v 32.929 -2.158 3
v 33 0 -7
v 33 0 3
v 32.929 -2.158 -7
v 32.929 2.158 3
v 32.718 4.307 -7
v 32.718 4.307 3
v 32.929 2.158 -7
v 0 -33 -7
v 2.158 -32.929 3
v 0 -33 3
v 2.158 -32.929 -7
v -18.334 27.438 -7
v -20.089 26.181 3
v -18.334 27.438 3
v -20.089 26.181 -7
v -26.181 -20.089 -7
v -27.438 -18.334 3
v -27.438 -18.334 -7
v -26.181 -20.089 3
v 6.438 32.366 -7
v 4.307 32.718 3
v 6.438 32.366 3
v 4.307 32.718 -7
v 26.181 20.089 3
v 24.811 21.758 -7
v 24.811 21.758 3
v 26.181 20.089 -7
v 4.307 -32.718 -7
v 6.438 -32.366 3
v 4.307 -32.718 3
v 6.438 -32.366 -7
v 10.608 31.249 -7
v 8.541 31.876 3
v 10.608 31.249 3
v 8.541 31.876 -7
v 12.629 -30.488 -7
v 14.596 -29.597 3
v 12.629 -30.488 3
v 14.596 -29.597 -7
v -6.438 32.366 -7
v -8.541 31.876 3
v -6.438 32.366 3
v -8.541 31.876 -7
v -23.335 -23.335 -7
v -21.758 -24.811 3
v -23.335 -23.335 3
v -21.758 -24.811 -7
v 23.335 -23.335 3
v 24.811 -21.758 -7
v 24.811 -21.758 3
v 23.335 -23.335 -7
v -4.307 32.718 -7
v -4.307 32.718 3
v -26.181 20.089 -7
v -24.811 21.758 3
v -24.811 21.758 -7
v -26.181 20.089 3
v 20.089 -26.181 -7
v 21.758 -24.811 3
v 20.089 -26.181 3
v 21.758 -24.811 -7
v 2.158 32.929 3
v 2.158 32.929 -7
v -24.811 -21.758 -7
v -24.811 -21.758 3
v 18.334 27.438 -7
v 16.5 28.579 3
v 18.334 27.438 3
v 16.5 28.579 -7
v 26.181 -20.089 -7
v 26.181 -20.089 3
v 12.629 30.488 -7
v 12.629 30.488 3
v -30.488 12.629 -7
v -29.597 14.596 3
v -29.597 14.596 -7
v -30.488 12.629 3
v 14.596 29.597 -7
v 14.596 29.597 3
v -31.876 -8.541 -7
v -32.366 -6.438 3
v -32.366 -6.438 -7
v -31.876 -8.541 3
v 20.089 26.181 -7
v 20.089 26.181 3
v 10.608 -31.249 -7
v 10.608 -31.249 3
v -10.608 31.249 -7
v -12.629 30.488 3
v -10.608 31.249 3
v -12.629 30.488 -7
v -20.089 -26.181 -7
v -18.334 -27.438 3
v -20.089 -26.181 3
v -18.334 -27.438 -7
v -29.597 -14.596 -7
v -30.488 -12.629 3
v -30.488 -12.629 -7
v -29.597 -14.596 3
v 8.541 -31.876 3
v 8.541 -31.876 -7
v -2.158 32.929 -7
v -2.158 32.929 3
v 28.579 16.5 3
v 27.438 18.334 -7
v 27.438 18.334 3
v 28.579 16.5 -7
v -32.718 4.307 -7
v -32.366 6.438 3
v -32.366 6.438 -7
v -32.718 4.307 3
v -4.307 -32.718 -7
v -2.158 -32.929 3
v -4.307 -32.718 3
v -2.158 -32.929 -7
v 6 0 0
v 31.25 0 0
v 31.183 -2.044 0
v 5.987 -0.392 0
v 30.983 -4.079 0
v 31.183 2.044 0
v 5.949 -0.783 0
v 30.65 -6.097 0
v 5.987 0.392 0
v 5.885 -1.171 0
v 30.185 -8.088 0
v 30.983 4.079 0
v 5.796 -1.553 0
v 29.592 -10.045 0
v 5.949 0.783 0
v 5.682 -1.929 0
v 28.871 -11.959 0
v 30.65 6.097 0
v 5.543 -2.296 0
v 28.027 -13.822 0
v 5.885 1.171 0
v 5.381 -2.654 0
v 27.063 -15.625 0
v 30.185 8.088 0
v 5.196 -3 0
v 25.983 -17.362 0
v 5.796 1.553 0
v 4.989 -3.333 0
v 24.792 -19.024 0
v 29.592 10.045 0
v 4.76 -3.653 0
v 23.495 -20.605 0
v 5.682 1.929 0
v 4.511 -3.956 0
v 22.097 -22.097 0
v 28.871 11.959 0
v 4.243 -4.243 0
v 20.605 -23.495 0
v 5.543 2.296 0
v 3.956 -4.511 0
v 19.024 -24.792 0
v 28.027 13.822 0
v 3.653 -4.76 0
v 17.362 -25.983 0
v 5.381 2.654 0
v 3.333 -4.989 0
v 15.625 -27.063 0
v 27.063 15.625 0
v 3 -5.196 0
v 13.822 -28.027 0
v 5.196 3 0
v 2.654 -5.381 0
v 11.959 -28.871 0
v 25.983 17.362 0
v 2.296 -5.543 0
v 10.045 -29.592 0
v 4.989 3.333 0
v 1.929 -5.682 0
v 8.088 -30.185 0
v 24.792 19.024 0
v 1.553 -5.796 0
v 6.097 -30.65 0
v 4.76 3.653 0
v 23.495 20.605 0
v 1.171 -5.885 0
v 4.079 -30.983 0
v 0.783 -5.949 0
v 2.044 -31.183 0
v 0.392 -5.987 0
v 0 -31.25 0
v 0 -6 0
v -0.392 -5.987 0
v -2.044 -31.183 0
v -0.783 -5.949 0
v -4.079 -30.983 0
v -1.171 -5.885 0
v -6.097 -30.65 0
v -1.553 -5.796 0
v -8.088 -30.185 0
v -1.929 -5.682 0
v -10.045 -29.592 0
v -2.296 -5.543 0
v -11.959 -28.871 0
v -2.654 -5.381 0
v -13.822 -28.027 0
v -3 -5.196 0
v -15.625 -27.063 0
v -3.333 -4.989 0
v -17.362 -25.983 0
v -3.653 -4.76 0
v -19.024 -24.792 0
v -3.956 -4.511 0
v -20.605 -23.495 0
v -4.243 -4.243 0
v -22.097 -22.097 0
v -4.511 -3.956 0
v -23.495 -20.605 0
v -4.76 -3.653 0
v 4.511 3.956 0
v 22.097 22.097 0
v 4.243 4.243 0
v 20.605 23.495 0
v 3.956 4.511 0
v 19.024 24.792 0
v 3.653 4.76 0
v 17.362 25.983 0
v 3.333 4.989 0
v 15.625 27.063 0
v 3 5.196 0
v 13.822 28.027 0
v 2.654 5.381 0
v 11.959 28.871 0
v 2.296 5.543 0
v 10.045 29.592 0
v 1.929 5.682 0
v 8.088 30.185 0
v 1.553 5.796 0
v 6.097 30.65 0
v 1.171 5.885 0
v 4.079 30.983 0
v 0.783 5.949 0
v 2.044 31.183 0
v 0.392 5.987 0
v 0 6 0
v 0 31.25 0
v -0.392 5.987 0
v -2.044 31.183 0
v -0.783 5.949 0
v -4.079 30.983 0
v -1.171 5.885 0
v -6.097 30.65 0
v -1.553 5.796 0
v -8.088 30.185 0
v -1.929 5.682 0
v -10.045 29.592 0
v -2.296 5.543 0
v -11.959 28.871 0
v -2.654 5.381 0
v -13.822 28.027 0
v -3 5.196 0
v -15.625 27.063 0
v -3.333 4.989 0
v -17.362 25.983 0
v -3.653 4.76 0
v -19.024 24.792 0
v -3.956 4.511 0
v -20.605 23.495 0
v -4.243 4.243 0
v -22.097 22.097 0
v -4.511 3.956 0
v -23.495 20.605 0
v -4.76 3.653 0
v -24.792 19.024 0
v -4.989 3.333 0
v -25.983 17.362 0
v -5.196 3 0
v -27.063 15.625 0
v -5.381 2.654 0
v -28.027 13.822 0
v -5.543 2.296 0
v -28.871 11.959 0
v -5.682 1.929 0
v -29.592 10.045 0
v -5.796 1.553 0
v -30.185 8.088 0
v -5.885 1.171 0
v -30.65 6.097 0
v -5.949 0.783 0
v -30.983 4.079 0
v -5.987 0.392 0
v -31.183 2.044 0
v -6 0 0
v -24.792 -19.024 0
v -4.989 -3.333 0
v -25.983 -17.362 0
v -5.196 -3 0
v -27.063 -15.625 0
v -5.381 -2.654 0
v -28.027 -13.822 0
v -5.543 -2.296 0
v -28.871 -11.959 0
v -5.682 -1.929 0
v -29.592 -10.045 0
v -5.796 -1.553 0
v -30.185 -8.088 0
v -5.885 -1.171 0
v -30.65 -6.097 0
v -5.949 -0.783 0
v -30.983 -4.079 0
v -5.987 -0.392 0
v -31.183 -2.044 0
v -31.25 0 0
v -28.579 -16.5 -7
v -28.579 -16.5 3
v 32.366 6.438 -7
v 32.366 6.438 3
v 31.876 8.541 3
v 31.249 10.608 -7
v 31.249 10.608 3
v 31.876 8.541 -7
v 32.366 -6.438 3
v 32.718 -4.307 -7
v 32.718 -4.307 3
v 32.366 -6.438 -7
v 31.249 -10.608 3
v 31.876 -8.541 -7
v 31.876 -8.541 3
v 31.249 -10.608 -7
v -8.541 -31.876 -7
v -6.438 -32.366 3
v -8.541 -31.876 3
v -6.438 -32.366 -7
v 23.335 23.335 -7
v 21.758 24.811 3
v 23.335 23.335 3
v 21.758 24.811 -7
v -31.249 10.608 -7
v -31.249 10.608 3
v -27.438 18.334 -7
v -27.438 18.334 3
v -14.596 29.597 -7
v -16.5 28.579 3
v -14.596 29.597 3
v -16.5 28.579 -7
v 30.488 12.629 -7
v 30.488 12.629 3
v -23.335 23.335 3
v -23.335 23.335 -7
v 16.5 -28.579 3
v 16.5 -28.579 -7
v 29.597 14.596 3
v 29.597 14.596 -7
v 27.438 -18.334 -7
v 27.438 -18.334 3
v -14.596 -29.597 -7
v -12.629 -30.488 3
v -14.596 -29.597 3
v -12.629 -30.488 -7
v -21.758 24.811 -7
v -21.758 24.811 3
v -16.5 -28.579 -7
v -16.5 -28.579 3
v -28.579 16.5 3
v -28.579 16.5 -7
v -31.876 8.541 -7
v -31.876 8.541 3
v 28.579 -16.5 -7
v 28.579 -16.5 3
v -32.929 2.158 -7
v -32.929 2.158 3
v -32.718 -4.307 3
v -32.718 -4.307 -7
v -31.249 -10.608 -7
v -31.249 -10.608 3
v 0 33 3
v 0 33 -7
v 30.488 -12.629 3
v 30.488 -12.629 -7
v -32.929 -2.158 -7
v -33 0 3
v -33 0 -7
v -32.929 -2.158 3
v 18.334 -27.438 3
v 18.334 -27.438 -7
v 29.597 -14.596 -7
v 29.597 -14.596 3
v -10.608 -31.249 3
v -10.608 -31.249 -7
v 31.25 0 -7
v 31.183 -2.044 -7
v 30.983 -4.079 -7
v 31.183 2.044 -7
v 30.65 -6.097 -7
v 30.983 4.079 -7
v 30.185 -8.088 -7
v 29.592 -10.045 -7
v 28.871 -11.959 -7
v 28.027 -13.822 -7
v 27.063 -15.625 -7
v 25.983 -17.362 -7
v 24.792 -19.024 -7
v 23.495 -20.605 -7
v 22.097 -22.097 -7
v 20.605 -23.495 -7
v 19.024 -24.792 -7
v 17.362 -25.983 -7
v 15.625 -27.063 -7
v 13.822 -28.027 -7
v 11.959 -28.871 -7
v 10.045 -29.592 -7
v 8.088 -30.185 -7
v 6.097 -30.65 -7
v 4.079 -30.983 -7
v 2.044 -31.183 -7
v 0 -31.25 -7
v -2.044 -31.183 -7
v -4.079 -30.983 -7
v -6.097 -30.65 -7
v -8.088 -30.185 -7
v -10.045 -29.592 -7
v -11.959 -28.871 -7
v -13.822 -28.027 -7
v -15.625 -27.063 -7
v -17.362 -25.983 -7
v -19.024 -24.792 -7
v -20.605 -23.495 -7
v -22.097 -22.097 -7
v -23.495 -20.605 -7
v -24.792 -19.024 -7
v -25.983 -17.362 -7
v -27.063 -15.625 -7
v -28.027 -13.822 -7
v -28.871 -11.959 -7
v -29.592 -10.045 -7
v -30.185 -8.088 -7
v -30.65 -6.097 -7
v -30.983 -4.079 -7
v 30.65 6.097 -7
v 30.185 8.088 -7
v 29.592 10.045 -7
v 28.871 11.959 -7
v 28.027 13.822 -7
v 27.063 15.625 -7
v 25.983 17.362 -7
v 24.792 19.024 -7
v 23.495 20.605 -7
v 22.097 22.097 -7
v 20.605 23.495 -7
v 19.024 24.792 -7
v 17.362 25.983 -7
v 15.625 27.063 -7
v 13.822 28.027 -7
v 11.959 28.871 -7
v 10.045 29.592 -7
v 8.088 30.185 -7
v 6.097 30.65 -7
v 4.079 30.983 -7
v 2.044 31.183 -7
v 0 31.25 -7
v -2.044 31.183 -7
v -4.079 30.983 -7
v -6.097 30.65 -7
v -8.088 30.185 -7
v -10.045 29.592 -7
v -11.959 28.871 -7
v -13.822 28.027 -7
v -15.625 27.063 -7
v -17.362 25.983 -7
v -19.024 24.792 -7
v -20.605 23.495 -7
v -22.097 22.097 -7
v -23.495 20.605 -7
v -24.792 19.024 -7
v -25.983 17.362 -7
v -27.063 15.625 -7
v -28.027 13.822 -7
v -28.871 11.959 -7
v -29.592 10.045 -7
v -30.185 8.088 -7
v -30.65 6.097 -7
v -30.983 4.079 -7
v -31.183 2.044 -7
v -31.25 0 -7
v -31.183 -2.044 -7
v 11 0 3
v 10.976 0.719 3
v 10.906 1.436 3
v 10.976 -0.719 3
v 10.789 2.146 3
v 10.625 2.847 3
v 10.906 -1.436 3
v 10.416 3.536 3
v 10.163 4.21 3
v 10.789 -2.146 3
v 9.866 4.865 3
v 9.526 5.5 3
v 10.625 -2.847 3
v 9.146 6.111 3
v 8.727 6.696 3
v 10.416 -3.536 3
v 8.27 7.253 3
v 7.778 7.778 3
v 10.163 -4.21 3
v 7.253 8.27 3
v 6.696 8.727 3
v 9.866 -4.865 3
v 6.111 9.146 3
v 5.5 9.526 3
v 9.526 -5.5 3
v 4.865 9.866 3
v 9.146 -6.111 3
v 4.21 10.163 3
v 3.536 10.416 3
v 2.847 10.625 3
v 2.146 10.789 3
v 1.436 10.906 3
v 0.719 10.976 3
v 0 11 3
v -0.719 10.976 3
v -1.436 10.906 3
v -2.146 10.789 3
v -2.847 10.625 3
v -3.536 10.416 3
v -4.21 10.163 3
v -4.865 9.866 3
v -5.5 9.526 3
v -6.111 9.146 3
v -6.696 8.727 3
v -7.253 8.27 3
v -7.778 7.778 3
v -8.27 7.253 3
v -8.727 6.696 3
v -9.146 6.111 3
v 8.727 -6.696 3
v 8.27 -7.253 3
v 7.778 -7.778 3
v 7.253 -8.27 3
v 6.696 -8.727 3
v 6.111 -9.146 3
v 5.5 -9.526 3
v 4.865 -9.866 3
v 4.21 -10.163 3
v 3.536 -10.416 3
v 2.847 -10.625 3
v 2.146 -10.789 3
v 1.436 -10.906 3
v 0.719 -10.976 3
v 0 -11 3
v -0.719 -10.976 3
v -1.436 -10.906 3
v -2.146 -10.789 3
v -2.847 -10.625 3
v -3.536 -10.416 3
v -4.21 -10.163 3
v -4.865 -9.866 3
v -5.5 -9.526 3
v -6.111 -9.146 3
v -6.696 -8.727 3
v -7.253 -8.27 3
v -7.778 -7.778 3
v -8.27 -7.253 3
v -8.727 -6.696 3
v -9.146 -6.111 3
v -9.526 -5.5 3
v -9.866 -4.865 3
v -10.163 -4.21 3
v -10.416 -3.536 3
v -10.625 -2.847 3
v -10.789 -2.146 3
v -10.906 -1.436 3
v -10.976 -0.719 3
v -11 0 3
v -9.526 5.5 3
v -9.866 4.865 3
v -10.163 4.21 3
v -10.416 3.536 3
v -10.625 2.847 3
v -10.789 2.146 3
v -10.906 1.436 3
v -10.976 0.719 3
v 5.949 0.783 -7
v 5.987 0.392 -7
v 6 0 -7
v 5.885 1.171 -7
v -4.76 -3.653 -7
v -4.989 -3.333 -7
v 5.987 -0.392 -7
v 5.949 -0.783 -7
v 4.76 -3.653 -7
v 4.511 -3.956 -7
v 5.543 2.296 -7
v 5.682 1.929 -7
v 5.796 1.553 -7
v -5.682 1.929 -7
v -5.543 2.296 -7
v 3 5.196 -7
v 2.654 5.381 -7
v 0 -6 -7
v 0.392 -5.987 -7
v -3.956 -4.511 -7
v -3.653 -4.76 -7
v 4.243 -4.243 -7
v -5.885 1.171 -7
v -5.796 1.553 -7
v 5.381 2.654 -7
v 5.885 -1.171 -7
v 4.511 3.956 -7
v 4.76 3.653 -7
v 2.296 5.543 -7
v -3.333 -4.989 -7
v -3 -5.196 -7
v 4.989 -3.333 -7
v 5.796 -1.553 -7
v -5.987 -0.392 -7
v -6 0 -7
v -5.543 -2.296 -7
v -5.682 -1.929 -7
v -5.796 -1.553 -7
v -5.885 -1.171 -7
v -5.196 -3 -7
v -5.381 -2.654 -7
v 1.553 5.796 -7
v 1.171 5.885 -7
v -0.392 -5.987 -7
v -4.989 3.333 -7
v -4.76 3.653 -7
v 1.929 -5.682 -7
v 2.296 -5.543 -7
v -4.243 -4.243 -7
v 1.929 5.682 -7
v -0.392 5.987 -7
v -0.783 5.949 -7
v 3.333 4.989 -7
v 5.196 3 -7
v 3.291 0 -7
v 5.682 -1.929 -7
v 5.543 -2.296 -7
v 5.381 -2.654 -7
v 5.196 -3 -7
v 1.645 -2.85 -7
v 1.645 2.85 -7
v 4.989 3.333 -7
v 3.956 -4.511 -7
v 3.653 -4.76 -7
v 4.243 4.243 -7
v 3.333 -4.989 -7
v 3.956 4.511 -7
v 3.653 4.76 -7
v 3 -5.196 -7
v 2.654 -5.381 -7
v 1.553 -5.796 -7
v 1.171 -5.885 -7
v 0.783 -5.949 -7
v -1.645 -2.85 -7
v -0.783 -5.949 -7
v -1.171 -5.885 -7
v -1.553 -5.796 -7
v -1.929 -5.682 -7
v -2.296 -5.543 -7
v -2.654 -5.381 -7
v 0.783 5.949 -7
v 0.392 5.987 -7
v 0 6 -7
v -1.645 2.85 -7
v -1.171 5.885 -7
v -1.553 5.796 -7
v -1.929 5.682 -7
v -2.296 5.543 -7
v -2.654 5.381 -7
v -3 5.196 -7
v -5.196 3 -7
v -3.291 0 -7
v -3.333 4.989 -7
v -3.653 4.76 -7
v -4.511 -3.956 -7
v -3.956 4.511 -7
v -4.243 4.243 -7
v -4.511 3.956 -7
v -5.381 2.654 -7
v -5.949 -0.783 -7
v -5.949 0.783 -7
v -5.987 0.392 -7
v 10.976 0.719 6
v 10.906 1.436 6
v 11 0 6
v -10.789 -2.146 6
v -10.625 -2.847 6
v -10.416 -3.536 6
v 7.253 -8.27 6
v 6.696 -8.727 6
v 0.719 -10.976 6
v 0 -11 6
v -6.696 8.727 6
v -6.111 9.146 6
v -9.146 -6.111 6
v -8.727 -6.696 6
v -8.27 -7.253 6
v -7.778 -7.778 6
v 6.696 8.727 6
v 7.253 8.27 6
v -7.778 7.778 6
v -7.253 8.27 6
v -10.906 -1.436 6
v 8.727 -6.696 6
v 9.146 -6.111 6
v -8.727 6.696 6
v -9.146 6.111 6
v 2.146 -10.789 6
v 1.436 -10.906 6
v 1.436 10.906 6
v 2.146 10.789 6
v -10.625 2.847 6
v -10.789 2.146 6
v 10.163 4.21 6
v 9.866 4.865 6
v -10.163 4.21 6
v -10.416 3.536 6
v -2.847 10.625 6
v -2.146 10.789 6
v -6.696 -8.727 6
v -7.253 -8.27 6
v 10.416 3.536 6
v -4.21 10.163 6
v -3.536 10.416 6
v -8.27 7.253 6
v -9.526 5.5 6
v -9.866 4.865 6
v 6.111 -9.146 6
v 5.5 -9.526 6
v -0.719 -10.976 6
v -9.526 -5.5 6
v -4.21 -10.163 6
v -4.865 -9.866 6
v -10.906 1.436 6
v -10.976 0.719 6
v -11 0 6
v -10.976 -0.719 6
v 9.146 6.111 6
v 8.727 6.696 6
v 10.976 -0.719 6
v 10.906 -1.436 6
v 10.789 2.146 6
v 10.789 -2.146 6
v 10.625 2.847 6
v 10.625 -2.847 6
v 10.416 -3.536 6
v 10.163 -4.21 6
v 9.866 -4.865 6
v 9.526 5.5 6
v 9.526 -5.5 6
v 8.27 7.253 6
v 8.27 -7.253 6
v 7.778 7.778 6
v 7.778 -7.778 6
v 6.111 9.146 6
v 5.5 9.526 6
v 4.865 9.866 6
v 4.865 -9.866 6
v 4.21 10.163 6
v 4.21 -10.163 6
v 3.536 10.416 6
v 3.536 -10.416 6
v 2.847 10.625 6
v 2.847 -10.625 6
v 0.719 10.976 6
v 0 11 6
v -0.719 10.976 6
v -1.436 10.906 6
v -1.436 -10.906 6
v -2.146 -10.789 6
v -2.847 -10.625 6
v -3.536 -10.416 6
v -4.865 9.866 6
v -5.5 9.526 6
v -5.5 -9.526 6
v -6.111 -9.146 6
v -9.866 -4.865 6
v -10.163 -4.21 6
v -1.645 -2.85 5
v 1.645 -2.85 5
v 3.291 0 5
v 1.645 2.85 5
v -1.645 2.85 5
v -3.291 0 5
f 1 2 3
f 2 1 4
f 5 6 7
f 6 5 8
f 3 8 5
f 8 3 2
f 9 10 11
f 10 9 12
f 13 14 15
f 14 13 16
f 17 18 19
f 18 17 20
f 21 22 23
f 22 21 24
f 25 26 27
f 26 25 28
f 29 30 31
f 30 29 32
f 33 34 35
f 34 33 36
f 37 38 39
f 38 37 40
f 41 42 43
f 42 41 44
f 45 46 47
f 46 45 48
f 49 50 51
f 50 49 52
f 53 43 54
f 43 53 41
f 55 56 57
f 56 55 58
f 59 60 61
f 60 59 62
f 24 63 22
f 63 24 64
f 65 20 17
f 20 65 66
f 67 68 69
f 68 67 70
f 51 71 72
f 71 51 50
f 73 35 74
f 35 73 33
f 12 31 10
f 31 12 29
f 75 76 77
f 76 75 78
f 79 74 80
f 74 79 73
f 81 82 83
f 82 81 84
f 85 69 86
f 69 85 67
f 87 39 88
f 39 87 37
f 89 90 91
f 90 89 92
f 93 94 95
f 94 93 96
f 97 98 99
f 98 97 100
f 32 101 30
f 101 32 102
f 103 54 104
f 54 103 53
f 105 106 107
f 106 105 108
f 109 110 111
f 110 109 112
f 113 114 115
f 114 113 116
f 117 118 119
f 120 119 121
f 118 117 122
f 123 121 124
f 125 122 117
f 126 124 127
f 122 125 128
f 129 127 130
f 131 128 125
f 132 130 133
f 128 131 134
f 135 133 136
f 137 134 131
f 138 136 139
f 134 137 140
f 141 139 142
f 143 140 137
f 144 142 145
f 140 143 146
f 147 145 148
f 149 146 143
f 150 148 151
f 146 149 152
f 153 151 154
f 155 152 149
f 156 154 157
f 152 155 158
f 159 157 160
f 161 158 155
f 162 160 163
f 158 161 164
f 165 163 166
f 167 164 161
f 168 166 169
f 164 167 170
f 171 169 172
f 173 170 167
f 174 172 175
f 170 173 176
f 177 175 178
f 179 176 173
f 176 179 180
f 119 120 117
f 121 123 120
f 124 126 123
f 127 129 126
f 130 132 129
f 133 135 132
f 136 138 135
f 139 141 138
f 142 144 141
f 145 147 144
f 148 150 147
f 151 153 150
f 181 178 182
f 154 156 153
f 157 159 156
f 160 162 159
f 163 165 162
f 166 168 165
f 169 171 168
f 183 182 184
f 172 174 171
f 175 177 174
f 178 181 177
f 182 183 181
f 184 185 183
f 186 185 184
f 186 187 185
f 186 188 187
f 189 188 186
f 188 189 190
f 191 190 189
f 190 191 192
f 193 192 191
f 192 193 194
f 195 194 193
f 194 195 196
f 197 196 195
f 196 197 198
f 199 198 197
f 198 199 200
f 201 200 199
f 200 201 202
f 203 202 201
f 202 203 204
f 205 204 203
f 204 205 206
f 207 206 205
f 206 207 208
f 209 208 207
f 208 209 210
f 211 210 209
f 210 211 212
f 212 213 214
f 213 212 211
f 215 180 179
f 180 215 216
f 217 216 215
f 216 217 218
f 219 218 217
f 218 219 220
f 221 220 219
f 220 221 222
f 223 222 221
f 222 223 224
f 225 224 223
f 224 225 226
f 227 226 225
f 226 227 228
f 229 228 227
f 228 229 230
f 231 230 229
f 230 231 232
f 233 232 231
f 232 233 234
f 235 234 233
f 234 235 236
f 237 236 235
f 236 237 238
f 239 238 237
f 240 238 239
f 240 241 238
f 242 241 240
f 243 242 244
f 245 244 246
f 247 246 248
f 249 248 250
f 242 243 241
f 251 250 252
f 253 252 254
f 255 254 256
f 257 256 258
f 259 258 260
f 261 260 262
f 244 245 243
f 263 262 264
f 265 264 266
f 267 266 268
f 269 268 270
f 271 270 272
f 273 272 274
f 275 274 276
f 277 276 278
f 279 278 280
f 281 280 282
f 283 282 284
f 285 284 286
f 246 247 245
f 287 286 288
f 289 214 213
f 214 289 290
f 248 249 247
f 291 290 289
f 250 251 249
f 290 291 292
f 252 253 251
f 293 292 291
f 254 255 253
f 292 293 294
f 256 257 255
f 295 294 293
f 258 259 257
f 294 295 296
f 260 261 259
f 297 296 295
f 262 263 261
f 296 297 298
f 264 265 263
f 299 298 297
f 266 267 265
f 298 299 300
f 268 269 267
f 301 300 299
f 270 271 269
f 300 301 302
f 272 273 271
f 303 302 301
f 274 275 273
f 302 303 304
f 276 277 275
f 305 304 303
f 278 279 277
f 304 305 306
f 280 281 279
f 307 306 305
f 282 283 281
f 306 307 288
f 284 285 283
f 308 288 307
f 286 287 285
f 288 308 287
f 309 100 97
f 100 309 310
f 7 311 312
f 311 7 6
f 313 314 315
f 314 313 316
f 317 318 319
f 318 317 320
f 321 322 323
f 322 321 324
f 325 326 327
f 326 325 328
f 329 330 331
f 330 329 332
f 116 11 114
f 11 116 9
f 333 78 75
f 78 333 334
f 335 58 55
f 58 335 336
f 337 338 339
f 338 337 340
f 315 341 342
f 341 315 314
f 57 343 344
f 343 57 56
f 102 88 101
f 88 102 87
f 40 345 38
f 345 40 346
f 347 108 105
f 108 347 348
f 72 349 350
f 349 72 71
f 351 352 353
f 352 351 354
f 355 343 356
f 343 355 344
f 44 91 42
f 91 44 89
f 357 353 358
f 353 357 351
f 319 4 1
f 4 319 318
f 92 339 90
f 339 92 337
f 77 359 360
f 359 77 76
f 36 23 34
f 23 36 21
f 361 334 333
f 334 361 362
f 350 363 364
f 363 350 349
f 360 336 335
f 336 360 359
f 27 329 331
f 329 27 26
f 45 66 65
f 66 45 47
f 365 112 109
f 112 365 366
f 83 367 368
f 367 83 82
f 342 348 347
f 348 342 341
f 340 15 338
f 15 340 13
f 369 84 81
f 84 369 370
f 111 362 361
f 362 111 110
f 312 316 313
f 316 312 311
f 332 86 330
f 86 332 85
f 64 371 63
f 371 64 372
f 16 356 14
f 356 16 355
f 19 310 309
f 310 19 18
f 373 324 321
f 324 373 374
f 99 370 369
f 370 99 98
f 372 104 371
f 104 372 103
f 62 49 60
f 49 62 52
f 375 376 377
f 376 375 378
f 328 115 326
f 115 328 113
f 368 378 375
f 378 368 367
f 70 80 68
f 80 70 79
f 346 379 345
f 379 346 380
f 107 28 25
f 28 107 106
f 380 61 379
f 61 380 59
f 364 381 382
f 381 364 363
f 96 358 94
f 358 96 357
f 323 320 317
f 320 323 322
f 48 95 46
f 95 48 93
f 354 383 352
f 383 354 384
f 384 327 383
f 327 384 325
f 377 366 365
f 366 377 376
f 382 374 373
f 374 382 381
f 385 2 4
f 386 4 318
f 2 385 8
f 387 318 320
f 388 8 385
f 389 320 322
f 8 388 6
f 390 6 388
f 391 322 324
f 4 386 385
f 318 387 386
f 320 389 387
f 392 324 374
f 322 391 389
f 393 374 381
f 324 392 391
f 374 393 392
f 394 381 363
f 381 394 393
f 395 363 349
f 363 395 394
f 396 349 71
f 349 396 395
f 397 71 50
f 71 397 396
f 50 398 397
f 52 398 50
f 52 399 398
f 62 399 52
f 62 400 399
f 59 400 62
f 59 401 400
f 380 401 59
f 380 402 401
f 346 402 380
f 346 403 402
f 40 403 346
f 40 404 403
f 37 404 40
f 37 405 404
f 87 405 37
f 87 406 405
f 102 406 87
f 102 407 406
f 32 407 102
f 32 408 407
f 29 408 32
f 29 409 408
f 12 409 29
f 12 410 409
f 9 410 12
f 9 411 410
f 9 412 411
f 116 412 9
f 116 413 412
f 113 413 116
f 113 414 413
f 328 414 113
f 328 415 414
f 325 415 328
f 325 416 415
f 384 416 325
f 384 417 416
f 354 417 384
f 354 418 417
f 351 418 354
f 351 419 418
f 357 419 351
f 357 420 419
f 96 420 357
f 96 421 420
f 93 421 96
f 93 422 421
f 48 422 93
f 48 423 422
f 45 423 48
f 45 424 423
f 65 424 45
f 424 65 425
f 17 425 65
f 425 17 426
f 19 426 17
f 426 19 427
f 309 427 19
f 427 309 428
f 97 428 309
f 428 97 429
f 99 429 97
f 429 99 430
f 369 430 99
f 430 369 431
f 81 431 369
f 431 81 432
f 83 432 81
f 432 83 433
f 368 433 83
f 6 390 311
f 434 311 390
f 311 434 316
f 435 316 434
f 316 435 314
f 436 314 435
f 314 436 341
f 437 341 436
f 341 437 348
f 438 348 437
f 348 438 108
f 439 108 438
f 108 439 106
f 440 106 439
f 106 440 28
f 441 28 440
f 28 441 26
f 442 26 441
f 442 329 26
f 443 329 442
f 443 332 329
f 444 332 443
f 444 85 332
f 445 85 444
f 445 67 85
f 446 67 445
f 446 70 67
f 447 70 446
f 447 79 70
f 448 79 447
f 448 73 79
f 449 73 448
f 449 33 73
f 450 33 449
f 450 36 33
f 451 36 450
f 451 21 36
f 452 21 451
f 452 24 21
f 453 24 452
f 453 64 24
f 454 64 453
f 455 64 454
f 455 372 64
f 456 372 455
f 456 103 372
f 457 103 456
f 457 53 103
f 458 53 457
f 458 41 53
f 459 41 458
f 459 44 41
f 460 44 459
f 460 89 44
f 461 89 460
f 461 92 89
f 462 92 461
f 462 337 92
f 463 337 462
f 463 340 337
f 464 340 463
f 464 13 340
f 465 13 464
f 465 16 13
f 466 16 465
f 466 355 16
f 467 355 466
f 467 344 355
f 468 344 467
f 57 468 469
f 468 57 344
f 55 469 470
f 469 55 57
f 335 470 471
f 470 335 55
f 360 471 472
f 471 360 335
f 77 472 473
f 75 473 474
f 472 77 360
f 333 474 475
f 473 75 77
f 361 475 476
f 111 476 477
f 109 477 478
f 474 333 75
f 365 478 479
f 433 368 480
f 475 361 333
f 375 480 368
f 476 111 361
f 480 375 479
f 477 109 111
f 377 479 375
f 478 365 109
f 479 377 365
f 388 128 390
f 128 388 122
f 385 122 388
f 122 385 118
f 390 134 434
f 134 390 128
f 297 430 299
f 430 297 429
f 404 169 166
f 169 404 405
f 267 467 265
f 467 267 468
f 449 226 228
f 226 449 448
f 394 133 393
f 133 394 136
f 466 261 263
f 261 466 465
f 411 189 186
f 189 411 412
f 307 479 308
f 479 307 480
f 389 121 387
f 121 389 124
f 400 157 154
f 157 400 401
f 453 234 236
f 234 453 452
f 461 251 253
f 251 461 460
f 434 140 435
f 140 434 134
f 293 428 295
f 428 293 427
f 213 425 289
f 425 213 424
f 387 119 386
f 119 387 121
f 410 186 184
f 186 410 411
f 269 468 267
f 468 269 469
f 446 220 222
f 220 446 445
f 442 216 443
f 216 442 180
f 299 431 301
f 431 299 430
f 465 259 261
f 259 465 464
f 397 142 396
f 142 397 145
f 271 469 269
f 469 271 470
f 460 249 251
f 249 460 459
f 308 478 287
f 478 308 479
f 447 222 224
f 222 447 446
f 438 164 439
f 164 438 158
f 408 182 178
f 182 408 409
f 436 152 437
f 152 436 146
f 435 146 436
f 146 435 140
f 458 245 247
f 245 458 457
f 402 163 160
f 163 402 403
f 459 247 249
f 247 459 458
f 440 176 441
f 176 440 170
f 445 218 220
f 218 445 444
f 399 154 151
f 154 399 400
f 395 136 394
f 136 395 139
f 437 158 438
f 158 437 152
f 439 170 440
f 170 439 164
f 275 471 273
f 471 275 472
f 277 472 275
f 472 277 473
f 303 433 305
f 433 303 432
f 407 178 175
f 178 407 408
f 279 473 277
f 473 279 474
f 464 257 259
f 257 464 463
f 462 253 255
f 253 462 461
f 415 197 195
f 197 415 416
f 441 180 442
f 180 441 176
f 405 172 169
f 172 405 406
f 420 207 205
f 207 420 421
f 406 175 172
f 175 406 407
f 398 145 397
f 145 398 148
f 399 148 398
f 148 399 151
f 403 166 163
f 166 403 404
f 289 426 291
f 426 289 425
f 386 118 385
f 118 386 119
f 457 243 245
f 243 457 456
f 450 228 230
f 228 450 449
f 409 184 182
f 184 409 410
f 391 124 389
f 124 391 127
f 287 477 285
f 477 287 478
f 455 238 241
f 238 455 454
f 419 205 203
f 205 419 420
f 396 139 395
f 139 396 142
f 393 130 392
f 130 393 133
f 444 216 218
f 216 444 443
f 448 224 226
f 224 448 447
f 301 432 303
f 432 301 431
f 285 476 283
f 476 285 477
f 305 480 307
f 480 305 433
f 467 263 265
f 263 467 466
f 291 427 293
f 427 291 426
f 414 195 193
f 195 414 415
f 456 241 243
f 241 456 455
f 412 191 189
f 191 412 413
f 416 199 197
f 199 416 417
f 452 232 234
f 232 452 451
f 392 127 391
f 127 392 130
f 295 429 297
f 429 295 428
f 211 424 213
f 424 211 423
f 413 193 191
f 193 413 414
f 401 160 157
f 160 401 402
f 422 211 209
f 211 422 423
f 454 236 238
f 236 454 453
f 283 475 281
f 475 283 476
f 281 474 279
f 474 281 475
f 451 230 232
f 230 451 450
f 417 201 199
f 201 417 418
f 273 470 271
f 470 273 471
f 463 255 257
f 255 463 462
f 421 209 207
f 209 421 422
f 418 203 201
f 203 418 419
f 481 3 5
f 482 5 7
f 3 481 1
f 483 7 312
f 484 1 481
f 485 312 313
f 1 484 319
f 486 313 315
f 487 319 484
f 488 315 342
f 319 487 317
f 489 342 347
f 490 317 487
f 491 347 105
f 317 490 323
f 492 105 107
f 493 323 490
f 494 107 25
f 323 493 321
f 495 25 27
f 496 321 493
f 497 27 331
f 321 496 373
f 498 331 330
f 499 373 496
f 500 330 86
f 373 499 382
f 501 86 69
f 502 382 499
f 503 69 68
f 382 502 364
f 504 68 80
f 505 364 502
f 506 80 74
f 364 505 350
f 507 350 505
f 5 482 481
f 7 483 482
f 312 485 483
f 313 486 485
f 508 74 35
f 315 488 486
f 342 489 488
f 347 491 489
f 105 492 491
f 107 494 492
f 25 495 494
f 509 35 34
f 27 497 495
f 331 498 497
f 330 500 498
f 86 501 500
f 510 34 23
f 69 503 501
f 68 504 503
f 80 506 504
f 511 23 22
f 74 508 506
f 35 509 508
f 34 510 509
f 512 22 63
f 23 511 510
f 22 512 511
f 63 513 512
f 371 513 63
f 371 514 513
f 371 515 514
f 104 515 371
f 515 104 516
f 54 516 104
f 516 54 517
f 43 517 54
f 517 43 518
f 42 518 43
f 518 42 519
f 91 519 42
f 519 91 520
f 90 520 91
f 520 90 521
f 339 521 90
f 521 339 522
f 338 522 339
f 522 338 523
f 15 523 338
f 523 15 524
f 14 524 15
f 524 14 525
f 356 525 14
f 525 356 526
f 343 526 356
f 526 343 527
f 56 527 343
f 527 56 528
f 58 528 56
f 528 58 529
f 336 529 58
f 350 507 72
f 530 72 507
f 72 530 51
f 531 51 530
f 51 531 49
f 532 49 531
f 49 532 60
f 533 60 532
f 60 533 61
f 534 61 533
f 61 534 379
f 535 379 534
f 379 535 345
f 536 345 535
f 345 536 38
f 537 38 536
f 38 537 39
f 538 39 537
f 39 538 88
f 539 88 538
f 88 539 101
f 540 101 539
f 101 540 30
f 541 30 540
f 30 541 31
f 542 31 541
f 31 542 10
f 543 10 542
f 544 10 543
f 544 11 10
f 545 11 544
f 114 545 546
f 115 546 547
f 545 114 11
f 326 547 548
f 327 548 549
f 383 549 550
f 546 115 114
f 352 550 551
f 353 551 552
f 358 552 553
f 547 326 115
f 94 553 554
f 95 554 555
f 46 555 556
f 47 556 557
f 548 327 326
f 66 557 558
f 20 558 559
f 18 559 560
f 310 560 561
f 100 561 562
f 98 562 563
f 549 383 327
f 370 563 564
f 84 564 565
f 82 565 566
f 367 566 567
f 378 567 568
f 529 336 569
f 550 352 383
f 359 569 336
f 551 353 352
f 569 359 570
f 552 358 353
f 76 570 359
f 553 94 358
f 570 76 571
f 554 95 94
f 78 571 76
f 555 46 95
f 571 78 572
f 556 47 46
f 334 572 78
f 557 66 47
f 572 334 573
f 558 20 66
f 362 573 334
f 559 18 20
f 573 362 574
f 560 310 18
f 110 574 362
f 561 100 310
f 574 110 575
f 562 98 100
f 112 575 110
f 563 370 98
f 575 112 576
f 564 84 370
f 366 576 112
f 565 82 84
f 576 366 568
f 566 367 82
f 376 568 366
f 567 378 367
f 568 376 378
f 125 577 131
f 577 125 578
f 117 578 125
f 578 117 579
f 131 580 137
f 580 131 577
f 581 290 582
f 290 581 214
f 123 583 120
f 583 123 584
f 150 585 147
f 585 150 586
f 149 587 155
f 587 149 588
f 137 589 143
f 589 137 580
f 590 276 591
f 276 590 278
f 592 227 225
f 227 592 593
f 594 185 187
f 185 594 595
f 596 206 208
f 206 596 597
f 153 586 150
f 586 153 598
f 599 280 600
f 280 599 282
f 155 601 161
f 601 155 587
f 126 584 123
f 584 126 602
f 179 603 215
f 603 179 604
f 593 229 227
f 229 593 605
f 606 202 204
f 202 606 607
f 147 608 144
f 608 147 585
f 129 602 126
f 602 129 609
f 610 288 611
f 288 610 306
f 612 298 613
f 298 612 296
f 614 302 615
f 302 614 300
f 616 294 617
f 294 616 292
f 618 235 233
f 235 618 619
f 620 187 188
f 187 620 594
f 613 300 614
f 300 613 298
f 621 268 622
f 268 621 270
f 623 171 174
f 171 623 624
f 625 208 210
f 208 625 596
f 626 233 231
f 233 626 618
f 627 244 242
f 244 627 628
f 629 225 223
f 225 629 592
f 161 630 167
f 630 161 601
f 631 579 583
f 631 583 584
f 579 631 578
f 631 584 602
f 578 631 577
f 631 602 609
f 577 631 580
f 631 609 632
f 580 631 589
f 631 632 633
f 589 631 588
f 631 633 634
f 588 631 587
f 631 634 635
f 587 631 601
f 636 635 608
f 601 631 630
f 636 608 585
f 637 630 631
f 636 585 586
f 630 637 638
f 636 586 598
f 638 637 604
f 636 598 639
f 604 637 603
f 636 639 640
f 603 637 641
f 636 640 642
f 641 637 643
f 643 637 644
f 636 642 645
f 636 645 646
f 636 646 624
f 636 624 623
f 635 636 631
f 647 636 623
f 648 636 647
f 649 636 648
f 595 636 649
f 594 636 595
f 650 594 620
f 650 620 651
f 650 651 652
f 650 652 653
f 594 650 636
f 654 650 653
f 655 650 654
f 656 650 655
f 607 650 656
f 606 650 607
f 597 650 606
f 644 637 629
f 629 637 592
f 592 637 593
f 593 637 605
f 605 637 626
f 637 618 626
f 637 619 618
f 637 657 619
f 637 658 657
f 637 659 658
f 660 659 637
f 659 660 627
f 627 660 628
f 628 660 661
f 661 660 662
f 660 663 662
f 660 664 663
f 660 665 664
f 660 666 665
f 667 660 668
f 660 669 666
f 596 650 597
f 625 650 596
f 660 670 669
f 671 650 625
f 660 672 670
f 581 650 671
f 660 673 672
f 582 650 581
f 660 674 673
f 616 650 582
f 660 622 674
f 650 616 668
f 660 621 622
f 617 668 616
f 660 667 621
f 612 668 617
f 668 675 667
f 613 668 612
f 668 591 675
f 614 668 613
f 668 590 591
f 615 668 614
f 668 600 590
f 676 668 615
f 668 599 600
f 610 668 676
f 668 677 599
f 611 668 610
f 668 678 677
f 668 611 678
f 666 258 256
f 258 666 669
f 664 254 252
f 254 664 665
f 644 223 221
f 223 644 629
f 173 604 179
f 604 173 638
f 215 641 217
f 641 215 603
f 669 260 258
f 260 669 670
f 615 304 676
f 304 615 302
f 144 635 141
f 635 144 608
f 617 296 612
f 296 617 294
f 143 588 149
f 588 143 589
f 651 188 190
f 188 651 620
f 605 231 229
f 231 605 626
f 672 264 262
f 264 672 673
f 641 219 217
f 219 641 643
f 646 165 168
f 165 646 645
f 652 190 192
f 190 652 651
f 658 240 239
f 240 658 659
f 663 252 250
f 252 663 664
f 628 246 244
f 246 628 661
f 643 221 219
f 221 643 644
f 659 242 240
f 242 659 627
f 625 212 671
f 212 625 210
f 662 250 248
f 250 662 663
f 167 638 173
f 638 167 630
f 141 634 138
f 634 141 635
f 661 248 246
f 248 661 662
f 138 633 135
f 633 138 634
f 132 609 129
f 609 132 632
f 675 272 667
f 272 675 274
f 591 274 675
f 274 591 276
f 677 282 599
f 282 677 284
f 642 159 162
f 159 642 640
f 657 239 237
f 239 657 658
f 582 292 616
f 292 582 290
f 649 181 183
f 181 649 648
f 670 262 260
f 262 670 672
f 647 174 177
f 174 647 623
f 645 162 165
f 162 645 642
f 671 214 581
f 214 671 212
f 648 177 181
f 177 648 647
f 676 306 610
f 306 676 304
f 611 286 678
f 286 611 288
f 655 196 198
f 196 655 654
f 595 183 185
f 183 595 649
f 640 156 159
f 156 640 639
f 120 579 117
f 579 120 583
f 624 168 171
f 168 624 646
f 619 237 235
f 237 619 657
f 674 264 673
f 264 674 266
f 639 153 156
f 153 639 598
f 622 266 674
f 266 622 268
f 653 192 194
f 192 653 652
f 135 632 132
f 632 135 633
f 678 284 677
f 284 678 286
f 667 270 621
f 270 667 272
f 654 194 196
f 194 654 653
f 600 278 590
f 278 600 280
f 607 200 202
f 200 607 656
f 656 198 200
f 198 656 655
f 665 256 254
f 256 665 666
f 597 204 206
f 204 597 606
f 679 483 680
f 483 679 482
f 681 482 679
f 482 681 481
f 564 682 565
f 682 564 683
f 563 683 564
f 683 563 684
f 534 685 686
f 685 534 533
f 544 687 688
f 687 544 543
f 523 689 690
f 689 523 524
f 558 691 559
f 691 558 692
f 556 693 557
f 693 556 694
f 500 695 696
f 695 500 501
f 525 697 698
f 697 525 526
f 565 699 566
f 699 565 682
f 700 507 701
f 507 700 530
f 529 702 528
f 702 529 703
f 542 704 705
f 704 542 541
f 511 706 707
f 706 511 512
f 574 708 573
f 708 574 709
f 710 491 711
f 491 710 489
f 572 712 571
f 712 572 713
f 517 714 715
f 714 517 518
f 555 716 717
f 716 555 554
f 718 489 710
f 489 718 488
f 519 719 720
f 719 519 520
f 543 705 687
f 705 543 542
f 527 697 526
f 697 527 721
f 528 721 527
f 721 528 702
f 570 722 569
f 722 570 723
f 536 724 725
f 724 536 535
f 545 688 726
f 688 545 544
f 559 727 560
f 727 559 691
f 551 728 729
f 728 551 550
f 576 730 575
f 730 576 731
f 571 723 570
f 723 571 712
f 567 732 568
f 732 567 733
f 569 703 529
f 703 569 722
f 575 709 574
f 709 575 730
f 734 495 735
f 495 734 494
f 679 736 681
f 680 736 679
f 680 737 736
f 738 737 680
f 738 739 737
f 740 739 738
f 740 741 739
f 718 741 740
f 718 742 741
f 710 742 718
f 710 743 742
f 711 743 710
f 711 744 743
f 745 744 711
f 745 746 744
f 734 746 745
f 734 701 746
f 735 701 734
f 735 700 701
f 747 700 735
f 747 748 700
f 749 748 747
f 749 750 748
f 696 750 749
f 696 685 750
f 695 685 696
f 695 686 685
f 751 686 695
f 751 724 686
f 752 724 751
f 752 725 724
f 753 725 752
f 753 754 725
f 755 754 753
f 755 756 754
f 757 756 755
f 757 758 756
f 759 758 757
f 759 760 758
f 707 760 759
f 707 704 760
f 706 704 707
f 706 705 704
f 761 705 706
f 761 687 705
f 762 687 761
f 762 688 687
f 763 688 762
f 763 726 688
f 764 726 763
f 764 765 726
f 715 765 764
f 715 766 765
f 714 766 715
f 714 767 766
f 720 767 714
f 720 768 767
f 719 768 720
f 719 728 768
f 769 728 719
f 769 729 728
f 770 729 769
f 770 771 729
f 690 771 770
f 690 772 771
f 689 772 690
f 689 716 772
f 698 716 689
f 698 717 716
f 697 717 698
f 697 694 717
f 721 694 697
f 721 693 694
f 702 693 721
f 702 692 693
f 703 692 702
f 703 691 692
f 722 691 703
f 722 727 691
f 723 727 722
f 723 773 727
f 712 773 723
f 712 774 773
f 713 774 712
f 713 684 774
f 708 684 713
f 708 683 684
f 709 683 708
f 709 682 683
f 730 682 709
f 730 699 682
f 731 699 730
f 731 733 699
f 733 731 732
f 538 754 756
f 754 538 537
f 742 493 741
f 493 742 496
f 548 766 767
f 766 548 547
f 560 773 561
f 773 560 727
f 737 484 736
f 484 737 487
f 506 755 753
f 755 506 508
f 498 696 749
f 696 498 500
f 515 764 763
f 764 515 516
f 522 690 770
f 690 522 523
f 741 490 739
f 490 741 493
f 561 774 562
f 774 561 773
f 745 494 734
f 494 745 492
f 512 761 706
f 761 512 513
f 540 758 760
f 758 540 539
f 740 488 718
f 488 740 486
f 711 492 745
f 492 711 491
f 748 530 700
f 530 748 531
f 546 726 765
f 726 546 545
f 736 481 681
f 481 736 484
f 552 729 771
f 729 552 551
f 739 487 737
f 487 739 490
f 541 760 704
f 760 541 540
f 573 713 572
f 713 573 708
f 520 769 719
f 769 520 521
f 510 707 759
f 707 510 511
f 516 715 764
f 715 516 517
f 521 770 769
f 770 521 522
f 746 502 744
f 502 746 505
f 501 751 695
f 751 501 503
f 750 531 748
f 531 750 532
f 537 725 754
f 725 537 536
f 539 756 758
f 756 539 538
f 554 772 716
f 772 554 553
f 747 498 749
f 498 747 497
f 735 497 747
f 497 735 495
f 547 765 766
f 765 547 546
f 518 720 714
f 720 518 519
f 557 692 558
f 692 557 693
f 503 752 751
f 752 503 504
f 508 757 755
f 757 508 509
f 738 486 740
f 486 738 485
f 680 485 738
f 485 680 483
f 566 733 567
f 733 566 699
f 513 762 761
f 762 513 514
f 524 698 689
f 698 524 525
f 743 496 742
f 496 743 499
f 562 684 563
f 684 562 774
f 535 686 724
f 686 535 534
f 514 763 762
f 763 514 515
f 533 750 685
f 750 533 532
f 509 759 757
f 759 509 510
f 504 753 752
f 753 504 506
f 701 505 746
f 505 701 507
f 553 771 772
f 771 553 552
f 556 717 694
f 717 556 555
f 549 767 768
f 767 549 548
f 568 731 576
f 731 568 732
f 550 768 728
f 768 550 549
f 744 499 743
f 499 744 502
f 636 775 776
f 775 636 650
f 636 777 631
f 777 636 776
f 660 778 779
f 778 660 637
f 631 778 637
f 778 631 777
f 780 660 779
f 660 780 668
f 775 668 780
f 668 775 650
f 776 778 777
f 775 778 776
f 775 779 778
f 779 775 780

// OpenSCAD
// C40 dust cap — umbrella type (light & fast to print)
// Sits on the body's top rim; a hex socket on the underside engages
// the drive shaft's hex to centre and hold it.
// Shaft hex: 5.5mm across flats (community data from a motorised
// adapter project; not an official spec). Socket modelled at 5.7mm
// = light fit, per the owner's preference (2026-11-26).
// The cup type lives in c40-dust-cap-v1.scad; this is the flat variant.

$fn = 96;

// --- parameters (mm) ---
disk_d       = 66;   // canopy diameter (body is ~60-61)
disk_t       = 3;    // canopy thickness
skirt_h      = 7;    // centring skirt height below the disk (= boss_h, so the bottom is one flat plane for printing)
skirt_in_d   = 62.5; // skirt inner diameter (body OD ~61 + clearance)
boss_d       = 12;   // centre boss outer diameter
boss_h       = 7;    // boss protrusion below disk underside
hex_af       = 5.7;  // hex socket across-flats (light fit on 5.5)
socket_depth = 12;   // socket depth measured from boss tip
grip_d       = 22;   // top grip bump diameter
grip_h       = 3;    // top grip bump height

module hex_prism(af, h) {
  // 6-facet cylinder sized so the across-flats distance equals af
  cylinder(h = h, r = af / sqrt(3), $fn = 6);
}

module umbrella_cap() {
  difference() {
    union() {
      // canopy disk
      cylinder(h = disk_t, d = disk_d);
      // centring skirt (ring that hugs the body's top outside)
      translate([0, 0, -skirt_h])
        difference() {
          cylinder(h = skirt_h, d = disk_d);
          translate([0, 0, -0.1]) cylinder(h = skirt_h + 0.2, d = skirt_in_d);
        }
      // centre boss reaching down to the shaft hex
      translate([0, 0, -boss_h]) cylinder(h = boss_h, d = boss_d);
      // top grip bump
      translate([0, 0, disk_t]) cylinder(h = grip_h, d = grip_d);
    }
    // hex socket (blind, opens at the boss tip)
    translate([0, 0, -boss_h - 0.1]) hex_prism(hex_af, socket_depth + 0.1);
  }
}

umbrella_cap();
